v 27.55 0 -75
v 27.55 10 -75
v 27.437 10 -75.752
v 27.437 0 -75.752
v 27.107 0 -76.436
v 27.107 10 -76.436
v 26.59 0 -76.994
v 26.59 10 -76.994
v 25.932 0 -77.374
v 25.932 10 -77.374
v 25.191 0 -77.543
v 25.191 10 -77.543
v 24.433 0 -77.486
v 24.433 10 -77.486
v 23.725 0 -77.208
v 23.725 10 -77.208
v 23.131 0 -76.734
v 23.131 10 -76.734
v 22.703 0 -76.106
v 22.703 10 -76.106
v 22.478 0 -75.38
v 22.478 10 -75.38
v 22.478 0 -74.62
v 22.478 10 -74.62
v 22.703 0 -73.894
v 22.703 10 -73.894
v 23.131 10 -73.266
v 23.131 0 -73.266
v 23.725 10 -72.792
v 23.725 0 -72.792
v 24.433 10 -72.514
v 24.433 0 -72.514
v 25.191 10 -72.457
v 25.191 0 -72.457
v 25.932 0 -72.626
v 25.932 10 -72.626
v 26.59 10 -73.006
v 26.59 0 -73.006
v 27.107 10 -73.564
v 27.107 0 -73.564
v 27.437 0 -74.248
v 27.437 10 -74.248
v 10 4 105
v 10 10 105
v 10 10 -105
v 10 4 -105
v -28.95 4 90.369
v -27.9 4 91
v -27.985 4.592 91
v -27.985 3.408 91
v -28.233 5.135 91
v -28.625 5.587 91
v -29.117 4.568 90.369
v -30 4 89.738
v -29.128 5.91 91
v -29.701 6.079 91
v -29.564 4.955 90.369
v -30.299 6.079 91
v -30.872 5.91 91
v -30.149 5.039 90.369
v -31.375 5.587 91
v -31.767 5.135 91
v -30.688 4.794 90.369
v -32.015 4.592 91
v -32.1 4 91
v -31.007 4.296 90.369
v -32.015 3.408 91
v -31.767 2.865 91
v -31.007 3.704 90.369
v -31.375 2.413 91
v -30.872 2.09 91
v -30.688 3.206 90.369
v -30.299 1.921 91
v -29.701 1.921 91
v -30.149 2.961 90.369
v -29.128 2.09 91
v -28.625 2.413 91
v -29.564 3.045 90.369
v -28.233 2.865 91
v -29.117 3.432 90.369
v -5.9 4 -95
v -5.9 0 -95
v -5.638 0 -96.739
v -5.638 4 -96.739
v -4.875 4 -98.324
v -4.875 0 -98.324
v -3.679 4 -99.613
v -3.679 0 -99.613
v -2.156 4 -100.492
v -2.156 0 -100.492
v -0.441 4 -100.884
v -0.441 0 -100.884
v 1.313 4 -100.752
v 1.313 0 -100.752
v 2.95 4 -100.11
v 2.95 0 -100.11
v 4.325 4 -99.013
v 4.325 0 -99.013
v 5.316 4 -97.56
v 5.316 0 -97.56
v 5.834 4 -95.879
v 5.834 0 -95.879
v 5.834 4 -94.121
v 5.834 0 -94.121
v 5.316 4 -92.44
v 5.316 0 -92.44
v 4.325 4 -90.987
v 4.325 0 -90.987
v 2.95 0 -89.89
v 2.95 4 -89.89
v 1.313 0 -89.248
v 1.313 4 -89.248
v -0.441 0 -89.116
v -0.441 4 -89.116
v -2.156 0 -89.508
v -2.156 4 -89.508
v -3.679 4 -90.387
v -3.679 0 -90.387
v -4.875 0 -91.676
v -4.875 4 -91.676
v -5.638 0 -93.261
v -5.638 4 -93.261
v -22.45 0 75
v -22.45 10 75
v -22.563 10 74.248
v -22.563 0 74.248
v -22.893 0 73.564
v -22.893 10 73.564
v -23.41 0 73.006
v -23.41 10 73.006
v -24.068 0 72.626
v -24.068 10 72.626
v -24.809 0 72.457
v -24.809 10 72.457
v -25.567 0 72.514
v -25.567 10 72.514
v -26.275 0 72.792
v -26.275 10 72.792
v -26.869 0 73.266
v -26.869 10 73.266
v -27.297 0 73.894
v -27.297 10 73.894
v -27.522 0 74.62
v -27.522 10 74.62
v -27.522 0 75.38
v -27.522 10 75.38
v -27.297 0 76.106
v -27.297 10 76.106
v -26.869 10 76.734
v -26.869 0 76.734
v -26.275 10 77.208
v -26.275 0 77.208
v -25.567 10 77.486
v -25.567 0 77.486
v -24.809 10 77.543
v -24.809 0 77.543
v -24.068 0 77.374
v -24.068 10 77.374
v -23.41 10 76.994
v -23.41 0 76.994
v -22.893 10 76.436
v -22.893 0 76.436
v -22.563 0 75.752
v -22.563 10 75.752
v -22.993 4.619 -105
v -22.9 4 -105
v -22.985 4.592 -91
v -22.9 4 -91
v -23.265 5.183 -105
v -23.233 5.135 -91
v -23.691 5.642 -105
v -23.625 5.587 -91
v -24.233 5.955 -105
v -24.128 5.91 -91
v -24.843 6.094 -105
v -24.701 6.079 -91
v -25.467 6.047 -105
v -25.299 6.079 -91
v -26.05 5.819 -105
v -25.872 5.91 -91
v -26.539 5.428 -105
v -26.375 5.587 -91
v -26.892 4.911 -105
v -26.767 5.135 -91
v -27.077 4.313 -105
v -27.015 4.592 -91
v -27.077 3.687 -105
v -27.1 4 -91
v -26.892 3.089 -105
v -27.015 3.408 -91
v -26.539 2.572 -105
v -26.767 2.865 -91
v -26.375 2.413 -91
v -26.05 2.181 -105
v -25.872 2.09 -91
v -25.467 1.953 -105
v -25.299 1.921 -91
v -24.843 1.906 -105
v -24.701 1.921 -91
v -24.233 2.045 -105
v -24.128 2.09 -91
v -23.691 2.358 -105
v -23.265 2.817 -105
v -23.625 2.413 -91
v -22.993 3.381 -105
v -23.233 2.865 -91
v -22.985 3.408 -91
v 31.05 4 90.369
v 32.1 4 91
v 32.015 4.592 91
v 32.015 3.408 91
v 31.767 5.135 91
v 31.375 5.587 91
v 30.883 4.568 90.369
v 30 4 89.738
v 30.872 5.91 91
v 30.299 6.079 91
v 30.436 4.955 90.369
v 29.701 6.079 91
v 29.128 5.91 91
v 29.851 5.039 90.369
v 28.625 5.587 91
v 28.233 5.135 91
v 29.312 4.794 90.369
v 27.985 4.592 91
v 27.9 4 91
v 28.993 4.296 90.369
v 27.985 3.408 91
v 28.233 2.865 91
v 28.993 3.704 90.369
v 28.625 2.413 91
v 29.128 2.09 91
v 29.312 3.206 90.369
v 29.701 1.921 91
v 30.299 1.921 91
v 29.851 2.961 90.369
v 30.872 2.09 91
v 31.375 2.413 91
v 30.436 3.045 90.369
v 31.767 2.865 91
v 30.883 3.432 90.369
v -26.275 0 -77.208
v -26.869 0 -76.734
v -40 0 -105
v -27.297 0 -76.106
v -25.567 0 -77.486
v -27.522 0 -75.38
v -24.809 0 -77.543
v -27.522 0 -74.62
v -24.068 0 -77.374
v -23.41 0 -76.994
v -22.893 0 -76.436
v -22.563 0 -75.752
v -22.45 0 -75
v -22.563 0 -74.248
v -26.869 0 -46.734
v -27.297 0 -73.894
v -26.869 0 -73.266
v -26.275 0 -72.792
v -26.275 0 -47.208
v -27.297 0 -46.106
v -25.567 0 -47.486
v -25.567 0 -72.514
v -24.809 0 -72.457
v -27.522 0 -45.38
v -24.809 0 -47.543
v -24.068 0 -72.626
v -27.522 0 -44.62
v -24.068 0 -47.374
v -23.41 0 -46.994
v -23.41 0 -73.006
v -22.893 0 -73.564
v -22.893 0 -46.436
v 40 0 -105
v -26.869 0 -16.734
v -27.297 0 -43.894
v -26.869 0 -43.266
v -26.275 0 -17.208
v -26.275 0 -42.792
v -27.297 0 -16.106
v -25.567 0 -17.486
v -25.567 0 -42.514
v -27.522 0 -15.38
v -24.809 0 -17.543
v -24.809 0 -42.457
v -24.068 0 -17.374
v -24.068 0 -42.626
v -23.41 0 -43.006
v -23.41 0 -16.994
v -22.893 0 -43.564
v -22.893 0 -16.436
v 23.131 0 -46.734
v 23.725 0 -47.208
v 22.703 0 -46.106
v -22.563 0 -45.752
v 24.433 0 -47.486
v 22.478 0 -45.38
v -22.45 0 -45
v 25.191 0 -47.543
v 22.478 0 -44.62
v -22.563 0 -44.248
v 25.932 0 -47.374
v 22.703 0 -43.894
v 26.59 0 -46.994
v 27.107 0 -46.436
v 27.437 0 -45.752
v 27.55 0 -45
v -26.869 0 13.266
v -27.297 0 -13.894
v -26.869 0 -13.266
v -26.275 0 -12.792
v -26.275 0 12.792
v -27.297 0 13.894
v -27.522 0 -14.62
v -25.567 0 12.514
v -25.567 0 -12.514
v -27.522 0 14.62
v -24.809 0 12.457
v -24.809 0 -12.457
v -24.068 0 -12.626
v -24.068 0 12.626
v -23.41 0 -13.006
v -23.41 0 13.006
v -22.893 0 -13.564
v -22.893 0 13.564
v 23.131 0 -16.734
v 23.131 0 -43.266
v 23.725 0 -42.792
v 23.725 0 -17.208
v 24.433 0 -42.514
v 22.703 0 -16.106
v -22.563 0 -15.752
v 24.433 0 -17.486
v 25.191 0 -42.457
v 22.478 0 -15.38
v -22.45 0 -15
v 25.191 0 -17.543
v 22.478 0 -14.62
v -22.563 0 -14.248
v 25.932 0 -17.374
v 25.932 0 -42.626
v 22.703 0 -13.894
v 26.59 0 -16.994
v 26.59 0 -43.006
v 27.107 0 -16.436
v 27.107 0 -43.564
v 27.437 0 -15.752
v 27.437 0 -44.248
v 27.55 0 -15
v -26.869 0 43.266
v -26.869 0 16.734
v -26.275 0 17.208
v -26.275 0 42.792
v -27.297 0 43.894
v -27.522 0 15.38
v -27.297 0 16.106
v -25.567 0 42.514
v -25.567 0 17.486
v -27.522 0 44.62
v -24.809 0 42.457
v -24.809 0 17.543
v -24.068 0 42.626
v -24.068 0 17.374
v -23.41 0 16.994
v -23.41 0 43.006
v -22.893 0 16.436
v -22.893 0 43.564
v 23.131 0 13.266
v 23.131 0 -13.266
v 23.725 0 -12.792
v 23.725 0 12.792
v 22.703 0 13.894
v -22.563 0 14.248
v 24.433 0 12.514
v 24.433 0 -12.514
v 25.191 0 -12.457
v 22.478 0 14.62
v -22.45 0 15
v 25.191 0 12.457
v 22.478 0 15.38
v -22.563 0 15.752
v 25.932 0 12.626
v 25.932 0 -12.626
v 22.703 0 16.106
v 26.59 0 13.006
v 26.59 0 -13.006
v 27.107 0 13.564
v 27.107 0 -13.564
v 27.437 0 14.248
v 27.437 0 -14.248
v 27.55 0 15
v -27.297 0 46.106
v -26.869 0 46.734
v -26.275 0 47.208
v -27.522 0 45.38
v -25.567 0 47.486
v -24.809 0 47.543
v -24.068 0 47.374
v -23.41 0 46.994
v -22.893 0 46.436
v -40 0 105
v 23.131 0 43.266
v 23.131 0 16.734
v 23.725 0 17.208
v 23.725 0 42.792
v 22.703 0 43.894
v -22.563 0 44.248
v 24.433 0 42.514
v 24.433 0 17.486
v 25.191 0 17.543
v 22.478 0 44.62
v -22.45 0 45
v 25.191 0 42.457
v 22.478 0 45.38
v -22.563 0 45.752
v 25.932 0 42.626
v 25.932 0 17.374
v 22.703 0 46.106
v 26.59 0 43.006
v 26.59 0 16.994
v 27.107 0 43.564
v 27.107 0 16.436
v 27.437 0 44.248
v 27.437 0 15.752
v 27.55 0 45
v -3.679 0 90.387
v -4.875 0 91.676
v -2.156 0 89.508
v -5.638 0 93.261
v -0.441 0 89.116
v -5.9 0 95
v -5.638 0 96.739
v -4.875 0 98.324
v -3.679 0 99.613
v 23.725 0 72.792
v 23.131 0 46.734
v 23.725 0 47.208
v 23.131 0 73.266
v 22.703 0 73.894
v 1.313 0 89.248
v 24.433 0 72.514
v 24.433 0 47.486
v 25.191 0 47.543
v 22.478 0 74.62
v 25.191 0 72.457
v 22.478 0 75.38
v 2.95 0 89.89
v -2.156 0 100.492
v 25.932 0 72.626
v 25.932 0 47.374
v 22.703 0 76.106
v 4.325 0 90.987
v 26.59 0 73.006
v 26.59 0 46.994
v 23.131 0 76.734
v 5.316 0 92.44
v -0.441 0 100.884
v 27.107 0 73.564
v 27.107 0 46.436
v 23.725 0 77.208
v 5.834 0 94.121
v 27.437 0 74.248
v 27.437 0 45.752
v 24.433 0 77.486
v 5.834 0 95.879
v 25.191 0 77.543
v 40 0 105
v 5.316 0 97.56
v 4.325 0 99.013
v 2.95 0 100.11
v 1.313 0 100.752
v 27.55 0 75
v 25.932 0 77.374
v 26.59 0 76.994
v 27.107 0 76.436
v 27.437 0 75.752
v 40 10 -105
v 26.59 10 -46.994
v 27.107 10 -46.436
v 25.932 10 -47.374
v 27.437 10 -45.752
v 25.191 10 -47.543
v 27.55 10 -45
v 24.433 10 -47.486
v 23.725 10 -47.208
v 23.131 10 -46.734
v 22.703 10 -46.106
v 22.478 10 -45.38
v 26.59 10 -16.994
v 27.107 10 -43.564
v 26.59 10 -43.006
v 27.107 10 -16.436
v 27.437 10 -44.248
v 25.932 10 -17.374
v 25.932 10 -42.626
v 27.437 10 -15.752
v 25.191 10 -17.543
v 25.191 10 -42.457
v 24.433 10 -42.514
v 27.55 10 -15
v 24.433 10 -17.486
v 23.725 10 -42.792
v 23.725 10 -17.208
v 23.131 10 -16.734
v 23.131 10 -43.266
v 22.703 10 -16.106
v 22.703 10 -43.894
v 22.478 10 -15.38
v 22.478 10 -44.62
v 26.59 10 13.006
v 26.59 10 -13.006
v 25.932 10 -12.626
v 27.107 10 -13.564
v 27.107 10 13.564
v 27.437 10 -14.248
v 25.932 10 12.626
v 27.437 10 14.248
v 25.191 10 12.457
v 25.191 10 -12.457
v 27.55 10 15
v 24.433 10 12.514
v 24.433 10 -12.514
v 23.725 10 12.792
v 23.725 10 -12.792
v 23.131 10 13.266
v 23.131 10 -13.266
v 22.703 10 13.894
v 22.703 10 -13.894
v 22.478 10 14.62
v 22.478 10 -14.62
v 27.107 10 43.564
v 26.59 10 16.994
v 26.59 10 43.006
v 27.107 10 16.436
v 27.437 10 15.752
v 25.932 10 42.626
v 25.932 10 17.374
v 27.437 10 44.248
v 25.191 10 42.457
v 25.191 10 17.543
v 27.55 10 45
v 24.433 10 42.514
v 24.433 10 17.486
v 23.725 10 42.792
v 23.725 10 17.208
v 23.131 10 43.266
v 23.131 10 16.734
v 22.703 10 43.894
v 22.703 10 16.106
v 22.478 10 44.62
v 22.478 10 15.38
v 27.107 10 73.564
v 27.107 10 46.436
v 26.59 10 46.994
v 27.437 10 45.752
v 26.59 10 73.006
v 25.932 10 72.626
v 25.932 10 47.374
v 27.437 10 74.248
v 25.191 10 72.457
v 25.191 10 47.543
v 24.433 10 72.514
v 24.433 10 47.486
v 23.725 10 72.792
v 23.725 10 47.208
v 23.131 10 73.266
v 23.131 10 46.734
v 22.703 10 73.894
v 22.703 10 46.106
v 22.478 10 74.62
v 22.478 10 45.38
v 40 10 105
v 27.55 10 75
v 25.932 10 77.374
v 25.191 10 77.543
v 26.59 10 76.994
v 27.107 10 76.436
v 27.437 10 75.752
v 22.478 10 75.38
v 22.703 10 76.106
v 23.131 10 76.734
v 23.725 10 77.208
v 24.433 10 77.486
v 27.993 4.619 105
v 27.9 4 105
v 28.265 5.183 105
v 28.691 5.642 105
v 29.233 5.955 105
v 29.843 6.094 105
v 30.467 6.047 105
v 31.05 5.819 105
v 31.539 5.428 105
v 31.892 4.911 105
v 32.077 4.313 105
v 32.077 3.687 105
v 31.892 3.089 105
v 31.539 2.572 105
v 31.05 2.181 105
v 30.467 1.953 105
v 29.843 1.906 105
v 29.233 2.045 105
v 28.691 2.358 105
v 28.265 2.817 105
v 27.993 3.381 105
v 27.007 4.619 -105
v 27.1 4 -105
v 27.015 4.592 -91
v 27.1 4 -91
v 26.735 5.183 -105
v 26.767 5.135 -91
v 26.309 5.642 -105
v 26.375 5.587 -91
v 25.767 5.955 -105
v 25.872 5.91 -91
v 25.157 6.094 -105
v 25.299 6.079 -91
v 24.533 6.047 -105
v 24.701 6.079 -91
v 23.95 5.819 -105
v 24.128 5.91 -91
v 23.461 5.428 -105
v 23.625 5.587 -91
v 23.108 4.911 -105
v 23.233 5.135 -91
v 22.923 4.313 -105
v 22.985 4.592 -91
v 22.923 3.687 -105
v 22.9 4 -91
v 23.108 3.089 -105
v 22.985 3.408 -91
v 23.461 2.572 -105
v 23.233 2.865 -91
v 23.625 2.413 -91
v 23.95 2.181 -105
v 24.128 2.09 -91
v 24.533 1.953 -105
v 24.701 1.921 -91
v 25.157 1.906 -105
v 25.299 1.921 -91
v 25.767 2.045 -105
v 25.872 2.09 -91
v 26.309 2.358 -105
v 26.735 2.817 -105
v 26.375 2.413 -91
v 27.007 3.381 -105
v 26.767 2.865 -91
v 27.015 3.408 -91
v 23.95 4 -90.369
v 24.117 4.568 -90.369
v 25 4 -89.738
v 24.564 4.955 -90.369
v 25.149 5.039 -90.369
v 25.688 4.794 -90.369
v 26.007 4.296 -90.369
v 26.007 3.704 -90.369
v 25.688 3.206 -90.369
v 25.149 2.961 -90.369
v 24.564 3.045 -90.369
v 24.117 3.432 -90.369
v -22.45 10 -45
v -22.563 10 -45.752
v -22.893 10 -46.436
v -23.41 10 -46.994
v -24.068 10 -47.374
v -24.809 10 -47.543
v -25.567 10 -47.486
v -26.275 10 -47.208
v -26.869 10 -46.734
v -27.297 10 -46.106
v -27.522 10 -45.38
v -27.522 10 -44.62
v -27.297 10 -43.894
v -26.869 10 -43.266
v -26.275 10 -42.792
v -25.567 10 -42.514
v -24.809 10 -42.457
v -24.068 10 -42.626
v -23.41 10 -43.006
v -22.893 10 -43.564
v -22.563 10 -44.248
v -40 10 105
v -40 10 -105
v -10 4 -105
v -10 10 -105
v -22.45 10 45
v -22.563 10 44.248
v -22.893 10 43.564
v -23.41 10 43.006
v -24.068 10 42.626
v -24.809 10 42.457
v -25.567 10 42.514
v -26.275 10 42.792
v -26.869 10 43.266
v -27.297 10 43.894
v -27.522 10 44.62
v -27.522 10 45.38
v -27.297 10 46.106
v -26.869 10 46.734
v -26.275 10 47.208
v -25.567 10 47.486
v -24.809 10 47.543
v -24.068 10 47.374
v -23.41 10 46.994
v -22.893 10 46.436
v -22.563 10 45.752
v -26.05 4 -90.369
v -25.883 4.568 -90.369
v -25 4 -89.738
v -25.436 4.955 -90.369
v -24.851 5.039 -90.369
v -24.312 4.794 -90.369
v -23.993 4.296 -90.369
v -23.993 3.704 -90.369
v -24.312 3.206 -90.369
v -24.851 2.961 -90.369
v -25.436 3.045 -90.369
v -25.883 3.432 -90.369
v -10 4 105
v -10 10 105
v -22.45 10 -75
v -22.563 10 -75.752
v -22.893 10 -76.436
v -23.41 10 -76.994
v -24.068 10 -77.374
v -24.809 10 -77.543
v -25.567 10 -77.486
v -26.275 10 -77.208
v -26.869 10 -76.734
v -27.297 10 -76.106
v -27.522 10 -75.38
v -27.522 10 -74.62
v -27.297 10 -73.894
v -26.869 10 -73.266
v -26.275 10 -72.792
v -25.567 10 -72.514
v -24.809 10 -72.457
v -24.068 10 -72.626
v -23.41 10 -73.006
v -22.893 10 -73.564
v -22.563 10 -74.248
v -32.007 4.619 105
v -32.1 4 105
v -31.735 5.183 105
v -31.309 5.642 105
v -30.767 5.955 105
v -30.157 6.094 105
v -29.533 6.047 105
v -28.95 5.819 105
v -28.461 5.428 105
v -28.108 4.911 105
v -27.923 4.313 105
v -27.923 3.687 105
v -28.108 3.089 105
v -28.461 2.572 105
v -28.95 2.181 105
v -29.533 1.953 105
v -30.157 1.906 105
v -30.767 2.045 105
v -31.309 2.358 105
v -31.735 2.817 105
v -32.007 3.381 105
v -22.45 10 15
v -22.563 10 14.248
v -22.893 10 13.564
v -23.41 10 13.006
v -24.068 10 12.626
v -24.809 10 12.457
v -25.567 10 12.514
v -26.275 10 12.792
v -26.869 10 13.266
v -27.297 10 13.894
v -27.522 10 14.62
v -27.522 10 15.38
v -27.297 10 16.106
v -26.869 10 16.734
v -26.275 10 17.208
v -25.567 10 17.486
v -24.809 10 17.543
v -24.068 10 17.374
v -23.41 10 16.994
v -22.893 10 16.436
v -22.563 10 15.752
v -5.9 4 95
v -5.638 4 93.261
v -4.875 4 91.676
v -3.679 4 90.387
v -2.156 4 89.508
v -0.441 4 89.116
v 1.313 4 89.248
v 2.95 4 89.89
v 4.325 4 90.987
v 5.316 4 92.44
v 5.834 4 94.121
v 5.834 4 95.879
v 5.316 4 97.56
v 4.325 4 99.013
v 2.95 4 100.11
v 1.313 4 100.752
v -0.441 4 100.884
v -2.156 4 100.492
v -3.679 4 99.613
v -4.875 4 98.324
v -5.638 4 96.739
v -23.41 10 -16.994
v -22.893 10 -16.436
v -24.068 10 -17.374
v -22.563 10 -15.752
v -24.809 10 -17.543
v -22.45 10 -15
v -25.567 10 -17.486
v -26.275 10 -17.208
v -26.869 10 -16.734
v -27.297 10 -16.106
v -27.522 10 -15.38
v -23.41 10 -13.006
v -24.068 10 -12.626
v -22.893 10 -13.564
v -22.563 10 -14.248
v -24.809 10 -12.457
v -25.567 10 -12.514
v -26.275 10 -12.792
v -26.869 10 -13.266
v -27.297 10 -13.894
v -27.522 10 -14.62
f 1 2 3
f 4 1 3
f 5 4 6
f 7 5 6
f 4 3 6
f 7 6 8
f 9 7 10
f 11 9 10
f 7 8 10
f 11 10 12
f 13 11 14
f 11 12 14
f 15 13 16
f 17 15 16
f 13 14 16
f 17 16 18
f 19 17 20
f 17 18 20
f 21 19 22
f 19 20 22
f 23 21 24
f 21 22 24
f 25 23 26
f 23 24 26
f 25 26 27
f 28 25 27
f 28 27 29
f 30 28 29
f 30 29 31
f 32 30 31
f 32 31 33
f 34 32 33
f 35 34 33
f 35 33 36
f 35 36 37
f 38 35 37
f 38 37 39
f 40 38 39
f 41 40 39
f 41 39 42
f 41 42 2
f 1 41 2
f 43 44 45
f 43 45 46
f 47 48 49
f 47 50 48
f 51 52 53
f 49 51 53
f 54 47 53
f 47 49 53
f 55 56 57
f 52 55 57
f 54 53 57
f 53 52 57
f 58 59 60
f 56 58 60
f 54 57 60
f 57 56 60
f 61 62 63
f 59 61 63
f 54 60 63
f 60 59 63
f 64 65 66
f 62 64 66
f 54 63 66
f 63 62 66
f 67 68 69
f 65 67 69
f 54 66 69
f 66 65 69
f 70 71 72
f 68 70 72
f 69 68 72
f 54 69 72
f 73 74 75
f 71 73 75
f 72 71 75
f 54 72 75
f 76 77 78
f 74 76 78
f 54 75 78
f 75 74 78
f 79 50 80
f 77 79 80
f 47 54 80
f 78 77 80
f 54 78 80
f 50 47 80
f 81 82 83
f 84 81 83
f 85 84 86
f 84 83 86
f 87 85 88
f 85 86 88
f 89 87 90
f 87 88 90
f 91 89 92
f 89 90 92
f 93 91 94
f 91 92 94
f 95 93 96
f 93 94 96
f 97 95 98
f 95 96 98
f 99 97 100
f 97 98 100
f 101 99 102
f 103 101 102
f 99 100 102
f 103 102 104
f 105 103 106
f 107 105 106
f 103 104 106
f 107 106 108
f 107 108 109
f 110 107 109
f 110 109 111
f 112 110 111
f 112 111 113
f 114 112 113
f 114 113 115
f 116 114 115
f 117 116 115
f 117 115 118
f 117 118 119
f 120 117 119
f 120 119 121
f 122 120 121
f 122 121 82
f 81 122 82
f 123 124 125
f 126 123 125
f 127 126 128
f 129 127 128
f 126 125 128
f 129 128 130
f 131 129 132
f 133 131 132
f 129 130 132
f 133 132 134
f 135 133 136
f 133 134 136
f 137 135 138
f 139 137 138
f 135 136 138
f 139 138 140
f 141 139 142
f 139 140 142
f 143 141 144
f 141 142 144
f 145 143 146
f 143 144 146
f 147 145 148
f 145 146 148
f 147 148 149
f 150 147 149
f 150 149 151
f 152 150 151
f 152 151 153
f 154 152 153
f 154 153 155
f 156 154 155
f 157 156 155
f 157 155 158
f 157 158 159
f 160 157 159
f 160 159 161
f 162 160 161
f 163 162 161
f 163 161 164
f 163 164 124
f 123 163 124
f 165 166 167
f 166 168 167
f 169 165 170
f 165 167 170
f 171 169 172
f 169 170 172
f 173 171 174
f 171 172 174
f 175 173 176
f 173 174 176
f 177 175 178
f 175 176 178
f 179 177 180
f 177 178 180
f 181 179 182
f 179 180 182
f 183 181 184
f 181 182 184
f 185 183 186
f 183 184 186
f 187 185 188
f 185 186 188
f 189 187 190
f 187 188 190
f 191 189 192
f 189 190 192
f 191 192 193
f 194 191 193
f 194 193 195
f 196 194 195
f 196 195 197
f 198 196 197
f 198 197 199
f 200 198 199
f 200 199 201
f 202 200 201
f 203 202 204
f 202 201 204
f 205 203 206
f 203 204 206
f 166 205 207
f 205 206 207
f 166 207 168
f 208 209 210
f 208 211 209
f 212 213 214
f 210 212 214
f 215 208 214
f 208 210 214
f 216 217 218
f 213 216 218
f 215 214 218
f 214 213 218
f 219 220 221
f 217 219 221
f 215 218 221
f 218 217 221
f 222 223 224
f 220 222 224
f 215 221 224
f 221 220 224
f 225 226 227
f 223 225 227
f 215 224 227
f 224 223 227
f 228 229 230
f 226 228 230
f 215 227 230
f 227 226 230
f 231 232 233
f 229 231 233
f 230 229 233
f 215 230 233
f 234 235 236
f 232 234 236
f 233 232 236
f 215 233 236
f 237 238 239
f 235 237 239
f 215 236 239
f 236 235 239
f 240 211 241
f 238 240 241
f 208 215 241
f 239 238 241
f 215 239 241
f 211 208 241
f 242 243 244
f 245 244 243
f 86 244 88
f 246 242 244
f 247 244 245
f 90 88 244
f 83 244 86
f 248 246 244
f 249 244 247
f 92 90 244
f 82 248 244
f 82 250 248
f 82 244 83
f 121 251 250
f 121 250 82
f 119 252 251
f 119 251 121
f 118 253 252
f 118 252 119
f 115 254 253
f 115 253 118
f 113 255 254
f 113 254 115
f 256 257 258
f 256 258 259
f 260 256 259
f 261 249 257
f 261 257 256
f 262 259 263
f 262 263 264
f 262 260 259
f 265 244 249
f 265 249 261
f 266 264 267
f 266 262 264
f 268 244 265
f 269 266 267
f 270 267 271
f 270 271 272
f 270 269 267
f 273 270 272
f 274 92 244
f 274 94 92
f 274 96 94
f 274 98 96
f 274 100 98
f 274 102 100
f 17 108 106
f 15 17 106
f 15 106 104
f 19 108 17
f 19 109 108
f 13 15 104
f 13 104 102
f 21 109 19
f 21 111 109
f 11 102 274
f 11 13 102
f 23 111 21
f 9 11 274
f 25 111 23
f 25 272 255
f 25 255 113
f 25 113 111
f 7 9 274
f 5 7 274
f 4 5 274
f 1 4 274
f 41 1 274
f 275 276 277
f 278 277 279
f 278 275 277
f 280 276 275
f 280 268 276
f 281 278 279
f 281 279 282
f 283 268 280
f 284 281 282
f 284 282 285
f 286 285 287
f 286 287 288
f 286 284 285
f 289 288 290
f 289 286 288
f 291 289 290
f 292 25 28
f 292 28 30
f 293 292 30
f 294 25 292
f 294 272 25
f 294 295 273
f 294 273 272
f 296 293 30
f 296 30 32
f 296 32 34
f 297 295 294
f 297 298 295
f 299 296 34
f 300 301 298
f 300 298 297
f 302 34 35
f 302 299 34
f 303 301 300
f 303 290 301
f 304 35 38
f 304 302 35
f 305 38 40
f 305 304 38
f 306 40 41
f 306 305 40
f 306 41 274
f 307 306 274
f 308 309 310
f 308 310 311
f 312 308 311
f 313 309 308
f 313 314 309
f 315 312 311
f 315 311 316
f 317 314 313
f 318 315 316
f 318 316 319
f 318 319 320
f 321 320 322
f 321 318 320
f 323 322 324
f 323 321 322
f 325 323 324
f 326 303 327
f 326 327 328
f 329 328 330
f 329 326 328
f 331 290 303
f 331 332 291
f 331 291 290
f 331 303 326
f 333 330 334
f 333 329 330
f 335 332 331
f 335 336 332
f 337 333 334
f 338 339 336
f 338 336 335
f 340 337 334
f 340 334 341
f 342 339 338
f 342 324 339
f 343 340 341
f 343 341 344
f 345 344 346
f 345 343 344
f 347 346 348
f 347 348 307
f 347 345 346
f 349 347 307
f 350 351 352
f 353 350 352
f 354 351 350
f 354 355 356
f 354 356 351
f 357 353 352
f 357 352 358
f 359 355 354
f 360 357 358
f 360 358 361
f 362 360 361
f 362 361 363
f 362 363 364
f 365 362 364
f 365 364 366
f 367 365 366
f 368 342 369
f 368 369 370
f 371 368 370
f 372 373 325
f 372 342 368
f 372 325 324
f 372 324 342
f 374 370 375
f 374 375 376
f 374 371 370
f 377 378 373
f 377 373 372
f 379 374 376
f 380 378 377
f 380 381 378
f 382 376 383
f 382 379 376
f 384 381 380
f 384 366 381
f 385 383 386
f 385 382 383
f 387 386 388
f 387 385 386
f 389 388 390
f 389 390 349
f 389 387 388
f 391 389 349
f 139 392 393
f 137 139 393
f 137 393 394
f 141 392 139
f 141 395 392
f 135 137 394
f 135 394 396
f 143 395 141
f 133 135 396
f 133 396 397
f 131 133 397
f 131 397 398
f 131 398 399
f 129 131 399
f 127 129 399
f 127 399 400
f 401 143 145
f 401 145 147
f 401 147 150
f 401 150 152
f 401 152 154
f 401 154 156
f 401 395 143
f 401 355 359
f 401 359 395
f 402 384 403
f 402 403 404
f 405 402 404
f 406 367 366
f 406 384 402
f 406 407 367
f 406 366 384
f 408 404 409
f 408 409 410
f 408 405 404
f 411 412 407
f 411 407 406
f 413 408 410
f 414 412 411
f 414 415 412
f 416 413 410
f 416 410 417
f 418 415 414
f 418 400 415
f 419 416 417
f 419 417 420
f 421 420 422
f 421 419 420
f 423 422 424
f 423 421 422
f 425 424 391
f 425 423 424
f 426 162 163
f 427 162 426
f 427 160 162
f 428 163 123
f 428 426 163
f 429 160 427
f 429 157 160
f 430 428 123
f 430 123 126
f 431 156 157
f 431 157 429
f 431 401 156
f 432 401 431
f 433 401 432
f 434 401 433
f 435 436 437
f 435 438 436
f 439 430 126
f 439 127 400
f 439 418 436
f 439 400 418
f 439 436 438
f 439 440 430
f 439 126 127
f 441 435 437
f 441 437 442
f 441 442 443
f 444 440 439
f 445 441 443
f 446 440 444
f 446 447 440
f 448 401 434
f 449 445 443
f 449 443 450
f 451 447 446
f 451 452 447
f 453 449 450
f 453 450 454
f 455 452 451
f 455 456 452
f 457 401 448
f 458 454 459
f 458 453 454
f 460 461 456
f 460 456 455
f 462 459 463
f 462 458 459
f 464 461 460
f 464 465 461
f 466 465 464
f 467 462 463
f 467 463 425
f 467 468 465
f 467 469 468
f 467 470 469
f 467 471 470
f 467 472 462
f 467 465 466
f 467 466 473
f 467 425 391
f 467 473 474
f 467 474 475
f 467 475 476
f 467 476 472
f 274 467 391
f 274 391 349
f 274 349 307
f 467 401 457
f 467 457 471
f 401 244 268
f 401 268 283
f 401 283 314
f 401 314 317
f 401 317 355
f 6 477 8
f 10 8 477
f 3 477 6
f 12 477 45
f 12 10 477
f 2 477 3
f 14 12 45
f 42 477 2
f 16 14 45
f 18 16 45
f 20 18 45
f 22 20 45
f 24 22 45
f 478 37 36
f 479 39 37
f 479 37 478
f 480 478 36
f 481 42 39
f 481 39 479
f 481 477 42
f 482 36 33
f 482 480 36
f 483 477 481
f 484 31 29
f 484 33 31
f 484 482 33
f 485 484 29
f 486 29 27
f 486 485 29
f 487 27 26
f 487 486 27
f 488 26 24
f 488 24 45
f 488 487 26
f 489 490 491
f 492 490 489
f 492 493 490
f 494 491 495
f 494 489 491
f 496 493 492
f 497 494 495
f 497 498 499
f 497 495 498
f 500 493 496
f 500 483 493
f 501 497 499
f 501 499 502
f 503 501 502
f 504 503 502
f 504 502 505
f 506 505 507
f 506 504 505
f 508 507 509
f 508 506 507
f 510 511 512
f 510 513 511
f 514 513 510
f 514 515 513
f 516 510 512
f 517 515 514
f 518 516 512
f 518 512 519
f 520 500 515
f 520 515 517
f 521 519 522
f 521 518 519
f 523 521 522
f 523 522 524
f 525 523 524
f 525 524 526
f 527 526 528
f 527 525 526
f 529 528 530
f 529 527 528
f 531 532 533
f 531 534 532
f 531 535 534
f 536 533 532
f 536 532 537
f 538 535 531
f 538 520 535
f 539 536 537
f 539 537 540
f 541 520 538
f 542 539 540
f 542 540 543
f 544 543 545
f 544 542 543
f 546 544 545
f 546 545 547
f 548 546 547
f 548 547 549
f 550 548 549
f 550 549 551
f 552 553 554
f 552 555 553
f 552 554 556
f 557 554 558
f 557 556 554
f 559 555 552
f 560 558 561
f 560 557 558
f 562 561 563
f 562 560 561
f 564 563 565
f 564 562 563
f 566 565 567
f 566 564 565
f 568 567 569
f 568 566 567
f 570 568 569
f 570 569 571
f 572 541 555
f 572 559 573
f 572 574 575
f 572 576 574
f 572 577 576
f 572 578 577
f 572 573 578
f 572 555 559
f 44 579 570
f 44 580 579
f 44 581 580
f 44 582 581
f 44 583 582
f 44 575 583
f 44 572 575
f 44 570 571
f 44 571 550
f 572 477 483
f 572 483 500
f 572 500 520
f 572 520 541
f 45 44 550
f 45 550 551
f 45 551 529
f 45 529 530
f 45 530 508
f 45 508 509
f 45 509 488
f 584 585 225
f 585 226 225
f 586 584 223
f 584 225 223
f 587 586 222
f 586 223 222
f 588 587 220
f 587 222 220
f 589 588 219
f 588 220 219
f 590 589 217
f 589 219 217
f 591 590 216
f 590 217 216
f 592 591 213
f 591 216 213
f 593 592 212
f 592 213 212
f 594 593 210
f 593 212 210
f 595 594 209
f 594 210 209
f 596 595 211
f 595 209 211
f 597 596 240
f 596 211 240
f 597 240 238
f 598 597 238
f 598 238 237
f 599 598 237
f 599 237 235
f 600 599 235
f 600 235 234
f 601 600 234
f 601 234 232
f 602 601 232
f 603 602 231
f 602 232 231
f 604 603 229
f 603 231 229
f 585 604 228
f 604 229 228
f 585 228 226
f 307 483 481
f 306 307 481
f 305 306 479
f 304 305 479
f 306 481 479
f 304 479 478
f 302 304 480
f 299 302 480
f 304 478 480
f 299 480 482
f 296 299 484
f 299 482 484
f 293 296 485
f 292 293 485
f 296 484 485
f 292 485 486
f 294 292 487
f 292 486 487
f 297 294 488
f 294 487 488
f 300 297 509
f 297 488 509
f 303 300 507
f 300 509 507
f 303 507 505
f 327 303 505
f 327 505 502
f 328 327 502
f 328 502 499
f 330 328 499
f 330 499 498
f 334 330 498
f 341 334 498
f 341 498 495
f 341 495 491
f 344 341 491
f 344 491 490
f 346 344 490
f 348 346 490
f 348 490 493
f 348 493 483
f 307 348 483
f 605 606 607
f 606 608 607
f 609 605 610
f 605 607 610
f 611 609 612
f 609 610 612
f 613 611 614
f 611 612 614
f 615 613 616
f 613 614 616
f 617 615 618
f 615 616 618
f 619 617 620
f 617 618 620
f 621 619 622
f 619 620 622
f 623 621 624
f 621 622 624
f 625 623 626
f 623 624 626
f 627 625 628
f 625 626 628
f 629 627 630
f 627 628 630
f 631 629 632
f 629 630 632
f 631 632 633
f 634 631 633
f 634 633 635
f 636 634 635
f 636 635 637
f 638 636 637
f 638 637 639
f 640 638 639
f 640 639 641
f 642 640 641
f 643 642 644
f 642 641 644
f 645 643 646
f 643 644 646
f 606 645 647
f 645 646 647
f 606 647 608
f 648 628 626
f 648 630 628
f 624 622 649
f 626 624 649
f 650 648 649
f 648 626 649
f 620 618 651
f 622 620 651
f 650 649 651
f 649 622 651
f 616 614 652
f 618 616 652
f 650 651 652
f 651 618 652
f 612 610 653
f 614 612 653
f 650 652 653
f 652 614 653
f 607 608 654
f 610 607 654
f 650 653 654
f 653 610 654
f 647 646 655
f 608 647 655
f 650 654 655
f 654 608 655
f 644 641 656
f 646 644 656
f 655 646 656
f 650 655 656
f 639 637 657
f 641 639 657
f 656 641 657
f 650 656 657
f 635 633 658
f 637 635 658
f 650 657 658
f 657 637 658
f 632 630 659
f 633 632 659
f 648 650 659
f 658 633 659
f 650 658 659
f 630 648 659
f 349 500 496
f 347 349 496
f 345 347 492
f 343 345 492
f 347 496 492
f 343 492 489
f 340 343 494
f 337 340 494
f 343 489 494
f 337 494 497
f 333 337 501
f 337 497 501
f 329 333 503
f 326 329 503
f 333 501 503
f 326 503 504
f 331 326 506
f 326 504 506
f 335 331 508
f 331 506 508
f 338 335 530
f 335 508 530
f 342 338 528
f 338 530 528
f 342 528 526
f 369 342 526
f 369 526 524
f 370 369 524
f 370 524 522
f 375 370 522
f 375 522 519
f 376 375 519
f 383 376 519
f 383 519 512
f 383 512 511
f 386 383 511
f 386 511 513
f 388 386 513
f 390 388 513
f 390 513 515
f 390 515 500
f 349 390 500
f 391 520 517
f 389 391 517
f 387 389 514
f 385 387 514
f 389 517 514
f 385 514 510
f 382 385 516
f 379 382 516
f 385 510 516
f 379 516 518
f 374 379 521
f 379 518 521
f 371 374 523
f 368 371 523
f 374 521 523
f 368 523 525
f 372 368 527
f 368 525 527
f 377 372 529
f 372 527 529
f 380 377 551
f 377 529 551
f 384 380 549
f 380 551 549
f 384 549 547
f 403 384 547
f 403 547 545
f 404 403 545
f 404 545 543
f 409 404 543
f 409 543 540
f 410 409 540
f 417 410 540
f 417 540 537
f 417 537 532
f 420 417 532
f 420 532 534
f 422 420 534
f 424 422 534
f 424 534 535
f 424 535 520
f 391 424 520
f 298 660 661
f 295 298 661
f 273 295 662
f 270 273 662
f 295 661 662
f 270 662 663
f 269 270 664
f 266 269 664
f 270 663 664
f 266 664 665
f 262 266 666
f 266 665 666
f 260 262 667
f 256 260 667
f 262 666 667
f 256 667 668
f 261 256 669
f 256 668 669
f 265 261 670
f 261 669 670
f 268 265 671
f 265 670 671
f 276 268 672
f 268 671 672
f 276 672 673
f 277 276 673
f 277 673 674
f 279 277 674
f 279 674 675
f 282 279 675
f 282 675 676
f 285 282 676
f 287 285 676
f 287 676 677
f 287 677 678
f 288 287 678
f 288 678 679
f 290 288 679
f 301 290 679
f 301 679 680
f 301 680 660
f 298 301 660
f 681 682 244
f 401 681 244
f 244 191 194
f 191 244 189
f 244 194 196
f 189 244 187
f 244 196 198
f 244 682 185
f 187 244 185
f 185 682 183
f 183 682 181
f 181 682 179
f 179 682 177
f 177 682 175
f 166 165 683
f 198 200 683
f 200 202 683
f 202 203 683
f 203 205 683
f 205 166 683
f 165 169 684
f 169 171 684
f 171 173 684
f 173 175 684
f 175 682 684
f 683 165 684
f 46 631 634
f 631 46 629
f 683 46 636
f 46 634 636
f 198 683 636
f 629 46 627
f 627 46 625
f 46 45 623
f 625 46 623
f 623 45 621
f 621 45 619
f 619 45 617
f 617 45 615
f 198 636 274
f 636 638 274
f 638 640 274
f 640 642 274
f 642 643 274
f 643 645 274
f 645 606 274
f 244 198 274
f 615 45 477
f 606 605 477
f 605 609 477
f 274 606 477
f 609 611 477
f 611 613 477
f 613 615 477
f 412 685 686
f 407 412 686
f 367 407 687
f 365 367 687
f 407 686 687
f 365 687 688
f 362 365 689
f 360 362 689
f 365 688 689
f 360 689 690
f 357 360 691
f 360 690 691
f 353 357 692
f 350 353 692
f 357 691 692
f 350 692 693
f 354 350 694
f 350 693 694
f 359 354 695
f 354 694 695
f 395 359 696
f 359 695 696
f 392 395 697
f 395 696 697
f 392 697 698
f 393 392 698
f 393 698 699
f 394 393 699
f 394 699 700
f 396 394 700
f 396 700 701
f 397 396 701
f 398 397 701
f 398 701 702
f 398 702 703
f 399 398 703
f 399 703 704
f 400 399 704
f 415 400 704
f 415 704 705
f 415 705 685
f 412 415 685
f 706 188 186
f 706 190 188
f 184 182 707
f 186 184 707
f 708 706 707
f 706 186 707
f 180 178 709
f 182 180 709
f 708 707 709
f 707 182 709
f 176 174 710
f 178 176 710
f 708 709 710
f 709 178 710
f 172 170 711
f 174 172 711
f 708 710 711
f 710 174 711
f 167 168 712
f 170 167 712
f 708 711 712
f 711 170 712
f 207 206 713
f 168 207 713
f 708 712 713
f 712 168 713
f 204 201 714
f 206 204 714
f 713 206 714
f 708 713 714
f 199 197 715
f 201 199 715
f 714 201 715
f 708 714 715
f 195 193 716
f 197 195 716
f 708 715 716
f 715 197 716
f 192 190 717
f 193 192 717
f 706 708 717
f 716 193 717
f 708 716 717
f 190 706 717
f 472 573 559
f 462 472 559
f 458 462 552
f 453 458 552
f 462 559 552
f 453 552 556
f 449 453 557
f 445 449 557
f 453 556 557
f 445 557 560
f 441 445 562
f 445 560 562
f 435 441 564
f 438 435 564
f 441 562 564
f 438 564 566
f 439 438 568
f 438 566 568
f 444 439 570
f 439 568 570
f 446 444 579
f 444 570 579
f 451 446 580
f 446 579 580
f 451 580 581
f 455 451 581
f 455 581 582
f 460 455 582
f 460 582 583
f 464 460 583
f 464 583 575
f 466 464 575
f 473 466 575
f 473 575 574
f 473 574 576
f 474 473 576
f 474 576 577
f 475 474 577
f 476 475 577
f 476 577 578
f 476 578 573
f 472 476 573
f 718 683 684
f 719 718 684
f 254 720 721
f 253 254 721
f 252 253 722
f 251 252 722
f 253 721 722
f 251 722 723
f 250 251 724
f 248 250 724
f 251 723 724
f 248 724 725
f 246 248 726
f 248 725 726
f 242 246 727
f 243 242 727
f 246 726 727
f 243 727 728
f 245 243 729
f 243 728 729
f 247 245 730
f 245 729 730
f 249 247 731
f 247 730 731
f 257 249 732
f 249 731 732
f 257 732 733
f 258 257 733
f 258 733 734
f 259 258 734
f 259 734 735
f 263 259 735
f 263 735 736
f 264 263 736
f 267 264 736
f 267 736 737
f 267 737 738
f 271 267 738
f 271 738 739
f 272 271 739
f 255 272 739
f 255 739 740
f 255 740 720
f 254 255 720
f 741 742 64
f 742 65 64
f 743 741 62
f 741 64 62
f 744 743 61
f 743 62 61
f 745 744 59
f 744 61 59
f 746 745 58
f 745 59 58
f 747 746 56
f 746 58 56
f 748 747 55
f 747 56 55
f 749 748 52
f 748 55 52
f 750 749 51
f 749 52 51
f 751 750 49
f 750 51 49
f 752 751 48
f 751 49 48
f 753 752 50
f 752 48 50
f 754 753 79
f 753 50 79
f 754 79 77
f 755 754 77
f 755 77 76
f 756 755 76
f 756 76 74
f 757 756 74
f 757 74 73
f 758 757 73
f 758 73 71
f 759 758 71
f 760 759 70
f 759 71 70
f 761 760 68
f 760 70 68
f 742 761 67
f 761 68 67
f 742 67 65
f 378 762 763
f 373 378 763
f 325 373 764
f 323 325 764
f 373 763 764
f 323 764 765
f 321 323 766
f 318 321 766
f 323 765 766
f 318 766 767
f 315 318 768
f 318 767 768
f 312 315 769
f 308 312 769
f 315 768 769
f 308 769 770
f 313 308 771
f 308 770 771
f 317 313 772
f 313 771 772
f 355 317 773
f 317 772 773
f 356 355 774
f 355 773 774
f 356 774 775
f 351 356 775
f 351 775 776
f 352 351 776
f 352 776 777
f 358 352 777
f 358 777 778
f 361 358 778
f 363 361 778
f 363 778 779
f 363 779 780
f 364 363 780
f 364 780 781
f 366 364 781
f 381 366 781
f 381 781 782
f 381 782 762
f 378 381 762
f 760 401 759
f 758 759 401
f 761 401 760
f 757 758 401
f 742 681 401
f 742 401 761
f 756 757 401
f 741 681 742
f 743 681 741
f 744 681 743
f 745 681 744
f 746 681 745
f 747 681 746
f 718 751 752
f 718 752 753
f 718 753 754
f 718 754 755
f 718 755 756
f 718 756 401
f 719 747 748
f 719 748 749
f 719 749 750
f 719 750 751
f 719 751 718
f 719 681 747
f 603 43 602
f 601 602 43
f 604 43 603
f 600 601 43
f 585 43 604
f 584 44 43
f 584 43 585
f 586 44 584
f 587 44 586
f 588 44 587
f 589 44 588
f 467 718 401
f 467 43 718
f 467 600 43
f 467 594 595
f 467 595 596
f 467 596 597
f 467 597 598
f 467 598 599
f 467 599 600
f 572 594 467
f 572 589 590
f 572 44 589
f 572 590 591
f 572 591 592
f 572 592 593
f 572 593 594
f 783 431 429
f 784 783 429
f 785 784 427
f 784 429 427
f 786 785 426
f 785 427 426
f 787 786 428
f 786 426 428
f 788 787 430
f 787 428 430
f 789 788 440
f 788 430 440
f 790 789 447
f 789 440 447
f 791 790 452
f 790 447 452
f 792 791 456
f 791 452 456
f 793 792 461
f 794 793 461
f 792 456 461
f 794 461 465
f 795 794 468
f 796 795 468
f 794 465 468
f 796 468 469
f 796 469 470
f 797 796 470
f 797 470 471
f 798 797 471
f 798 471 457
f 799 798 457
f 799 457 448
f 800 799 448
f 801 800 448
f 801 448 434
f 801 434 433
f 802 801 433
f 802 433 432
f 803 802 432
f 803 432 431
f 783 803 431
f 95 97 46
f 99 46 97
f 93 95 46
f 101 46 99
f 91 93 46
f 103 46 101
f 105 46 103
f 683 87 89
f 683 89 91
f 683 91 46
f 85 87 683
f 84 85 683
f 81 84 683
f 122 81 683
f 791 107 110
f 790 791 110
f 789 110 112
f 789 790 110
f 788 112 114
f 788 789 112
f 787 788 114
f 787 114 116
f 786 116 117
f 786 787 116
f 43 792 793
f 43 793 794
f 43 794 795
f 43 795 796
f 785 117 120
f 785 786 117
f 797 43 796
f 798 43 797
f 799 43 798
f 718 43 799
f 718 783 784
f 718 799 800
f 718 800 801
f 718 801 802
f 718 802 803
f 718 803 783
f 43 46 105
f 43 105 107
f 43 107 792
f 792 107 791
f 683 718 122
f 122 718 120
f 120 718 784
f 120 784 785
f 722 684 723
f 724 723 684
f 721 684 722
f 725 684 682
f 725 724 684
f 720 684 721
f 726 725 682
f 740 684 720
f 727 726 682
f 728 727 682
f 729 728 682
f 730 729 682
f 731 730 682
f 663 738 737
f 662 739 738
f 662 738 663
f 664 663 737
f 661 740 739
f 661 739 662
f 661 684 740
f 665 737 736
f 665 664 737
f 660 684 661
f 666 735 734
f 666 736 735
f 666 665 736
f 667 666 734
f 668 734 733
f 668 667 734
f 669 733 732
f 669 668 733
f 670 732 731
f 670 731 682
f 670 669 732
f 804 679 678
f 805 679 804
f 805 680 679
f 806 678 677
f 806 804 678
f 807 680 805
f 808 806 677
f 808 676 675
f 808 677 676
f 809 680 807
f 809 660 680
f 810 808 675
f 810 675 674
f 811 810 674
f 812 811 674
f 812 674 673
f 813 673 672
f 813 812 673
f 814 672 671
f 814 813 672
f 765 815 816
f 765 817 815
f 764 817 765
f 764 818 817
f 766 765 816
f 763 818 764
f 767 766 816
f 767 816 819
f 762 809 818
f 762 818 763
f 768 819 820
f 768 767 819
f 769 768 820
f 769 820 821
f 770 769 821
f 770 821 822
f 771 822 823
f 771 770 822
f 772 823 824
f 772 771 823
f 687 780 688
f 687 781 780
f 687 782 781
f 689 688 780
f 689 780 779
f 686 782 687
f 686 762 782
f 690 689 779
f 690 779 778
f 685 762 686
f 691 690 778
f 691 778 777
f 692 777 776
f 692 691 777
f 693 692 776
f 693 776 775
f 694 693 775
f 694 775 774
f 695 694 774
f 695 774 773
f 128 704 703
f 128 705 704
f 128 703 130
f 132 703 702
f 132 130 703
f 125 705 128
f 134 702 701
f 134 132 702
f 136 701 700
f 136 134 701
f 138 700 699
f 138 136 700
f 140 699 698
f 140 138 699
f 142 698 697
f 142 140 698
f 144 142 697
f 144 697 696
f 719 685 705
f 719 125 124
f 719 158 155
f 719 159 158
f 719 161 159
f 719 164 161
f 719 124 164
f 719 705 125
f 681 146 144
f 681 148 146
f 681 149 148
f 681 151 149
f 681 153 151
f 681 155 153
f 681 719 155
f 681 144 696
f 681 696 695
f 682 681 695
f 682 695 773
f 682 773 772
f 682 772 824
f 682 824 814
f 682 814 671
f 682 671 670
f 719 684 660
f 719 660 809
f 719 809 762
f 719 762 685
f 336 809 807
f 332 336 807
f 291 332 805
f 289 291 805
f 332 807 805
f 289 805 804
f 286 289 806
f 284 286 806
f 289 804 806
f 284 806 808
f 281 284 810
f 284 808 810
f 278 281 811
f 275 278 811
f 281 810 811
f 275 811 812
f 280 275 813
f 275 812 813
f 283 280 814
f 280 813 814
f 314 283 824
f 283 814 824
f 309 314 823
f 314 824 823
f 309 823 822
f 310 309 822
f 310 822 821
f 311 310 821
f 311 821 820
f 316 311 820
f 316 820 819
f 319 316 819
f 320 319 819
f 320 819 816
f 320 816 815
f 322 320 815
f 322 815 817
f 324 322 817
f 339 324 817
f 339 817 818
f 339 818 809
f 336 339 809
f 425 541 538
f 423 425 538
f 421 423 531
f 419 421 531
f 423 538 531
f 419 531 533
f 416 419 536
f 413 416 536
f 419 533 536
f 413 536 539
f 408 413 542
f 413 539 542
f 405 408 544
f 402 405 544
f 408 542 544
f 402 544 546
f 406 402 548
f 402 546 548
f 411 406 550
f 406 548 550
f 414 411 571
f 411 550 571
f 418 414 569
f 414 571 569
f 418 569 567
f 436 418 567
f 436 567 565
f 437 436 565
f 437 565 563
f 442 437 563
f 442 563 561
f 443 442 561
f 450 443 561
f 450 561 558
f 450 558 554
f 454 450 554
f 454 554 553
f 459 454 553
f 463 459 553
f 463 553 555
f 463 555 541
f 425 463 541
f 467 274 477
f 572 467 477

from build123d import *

# Parameters (mm, degrees)
AUFSATZ_LINEAR_AUSTRAGEN1_DEPTH = 105
M5_GEWINDEBOHRUNG1_D            = 4.2
M5_GEWINDEBOHRUNG1_DEPTH        = 14
M5_GEWINDEBOHRUNG1_TIP          = 1.2618073
M5_GEWINDEBOHRUNG2_D            = 4.2
M5_GEWINDEBOHRUNG2_DEPTH        = 14
M5_GEWINDEBOHRUNG2_TIP          = 1.2618073
SKIZZE10_R                      = 2.55
SCHNITT_LINEAR_AUSTRAGEN1_DEPTH = 11
G1_4_GEWINDEBOHRUNG1_D          = 11.8


with BuildPart() as part:
    # Skizze1 → Aufsatz-Linear austragen1 (new body, symmetric)
    with BuildSketch(Plane.XY):
        Polygon((-40, 0), (40, 0), (40, 10), (10, 10), (10, 4), (-10, 4), (-10, 10), (-40, 10), align=None)
    extrude(amount=AUFSATZ_LINEAR_AUSTRAGEN1_DEPTH, both=True)

    # M5 Gewindebohrung1
    with Locations(Plane.XY.offset(105)):
        with Locations((-30, 4), (30, 4)):
            Hole(M5_GEWINDEBOHRUNG1_D / 2, depth=M5_GEWINDEBOHRUNG1_DEPTH)
            with Locations((0, 0, -(M5_GEWINDEBOHRUNG1_DEPTH + M5_GEWINDEBOHRUNG1_TIP / 2))):  # 118° drill point
                Cone(0, M5_GEWINDEBOHRUNG1_D / 2, M5_GEWINDEBOHRUNG1_TIP, mode=Mode.SUBTRACT)

    # M5 Gewindebohrung2
    with Locations(Plane(origin=(0, 0, -105), x_dir=(-1, 0, 0), z_dir=(0, 0, -1))):
        with Locations((-25, 4), (25, 4)):
            Hole(M5_GEWINDEBOHRUNG2_D / 2, depth=M5_GEWINDEBOHRUNG2_DEPTH)
            with Locations((0, 0, -(M5_GEWINDEBOHRUNG2_DEPTH + M5_GEWINDEBOHRUNG2_TIP / 2))):  # 118° drill point
                Cone(0, M5_GEWINDEBOHRUNG2_D / 2, M5_GEWINDEBOHRUNG2_TIP, mode=Mode.SUBTRACT)

    # Skizze10 → Schnitt-Linear austragen1 (cut, through all)
    with BuildSketch(Plane(origin=(0, 10, 0), x_dir=(1, 0, 0), z_dir=(0, 1, 0))):
        with Locations((25, 75)):
            Circle(SKIZZE10_R)
        with Locations((25, 45)):
            Circle(SKIZZE10_R)
        with Locations((25, 15)):
            Circle(SKIZZE10_R)
        with Locations((25, -15)):
            Circle(SKIZZE10_R)
        with Locations((25, -45)):
            Circle(SKIZZE10_R)
        with Locations((25, -75)):
            Circle(SKIZZE10_R)
        with Locations((-25, -75)):
            Circle(SKIZZE10_R)
        with Locations((-25, -45)):
            Circle(SKIZZE10_R)
        with Locations((-25, -15)):
            Circle(SKIZZE10_R)
        with Locations((-25, 15)):
            Circle(SKIZZE10_R)
        with Locations((-25, 45)):
            Circle(SKIZZE10_R)
        with Locations((-25, 75)):
            Circle(SKIZZE10_R)
    extrude(amount=-SCHNITT_LINEAR_AUSTRAGEN1_DEPTH, mode=Mode.SUBTRACT)

    # G1/4 Gewindebohrung1 (through all)
    with Locations(Plane(origin=(0, 4, 0), x_dir=(1, 0, 0), z_dir=(0, 1, 0))):
        with Locations((0, 95), (0, -95)):
            Hole(G1_4_GEWINDEBOHRUNG1_D / 2)


solid = part.part
